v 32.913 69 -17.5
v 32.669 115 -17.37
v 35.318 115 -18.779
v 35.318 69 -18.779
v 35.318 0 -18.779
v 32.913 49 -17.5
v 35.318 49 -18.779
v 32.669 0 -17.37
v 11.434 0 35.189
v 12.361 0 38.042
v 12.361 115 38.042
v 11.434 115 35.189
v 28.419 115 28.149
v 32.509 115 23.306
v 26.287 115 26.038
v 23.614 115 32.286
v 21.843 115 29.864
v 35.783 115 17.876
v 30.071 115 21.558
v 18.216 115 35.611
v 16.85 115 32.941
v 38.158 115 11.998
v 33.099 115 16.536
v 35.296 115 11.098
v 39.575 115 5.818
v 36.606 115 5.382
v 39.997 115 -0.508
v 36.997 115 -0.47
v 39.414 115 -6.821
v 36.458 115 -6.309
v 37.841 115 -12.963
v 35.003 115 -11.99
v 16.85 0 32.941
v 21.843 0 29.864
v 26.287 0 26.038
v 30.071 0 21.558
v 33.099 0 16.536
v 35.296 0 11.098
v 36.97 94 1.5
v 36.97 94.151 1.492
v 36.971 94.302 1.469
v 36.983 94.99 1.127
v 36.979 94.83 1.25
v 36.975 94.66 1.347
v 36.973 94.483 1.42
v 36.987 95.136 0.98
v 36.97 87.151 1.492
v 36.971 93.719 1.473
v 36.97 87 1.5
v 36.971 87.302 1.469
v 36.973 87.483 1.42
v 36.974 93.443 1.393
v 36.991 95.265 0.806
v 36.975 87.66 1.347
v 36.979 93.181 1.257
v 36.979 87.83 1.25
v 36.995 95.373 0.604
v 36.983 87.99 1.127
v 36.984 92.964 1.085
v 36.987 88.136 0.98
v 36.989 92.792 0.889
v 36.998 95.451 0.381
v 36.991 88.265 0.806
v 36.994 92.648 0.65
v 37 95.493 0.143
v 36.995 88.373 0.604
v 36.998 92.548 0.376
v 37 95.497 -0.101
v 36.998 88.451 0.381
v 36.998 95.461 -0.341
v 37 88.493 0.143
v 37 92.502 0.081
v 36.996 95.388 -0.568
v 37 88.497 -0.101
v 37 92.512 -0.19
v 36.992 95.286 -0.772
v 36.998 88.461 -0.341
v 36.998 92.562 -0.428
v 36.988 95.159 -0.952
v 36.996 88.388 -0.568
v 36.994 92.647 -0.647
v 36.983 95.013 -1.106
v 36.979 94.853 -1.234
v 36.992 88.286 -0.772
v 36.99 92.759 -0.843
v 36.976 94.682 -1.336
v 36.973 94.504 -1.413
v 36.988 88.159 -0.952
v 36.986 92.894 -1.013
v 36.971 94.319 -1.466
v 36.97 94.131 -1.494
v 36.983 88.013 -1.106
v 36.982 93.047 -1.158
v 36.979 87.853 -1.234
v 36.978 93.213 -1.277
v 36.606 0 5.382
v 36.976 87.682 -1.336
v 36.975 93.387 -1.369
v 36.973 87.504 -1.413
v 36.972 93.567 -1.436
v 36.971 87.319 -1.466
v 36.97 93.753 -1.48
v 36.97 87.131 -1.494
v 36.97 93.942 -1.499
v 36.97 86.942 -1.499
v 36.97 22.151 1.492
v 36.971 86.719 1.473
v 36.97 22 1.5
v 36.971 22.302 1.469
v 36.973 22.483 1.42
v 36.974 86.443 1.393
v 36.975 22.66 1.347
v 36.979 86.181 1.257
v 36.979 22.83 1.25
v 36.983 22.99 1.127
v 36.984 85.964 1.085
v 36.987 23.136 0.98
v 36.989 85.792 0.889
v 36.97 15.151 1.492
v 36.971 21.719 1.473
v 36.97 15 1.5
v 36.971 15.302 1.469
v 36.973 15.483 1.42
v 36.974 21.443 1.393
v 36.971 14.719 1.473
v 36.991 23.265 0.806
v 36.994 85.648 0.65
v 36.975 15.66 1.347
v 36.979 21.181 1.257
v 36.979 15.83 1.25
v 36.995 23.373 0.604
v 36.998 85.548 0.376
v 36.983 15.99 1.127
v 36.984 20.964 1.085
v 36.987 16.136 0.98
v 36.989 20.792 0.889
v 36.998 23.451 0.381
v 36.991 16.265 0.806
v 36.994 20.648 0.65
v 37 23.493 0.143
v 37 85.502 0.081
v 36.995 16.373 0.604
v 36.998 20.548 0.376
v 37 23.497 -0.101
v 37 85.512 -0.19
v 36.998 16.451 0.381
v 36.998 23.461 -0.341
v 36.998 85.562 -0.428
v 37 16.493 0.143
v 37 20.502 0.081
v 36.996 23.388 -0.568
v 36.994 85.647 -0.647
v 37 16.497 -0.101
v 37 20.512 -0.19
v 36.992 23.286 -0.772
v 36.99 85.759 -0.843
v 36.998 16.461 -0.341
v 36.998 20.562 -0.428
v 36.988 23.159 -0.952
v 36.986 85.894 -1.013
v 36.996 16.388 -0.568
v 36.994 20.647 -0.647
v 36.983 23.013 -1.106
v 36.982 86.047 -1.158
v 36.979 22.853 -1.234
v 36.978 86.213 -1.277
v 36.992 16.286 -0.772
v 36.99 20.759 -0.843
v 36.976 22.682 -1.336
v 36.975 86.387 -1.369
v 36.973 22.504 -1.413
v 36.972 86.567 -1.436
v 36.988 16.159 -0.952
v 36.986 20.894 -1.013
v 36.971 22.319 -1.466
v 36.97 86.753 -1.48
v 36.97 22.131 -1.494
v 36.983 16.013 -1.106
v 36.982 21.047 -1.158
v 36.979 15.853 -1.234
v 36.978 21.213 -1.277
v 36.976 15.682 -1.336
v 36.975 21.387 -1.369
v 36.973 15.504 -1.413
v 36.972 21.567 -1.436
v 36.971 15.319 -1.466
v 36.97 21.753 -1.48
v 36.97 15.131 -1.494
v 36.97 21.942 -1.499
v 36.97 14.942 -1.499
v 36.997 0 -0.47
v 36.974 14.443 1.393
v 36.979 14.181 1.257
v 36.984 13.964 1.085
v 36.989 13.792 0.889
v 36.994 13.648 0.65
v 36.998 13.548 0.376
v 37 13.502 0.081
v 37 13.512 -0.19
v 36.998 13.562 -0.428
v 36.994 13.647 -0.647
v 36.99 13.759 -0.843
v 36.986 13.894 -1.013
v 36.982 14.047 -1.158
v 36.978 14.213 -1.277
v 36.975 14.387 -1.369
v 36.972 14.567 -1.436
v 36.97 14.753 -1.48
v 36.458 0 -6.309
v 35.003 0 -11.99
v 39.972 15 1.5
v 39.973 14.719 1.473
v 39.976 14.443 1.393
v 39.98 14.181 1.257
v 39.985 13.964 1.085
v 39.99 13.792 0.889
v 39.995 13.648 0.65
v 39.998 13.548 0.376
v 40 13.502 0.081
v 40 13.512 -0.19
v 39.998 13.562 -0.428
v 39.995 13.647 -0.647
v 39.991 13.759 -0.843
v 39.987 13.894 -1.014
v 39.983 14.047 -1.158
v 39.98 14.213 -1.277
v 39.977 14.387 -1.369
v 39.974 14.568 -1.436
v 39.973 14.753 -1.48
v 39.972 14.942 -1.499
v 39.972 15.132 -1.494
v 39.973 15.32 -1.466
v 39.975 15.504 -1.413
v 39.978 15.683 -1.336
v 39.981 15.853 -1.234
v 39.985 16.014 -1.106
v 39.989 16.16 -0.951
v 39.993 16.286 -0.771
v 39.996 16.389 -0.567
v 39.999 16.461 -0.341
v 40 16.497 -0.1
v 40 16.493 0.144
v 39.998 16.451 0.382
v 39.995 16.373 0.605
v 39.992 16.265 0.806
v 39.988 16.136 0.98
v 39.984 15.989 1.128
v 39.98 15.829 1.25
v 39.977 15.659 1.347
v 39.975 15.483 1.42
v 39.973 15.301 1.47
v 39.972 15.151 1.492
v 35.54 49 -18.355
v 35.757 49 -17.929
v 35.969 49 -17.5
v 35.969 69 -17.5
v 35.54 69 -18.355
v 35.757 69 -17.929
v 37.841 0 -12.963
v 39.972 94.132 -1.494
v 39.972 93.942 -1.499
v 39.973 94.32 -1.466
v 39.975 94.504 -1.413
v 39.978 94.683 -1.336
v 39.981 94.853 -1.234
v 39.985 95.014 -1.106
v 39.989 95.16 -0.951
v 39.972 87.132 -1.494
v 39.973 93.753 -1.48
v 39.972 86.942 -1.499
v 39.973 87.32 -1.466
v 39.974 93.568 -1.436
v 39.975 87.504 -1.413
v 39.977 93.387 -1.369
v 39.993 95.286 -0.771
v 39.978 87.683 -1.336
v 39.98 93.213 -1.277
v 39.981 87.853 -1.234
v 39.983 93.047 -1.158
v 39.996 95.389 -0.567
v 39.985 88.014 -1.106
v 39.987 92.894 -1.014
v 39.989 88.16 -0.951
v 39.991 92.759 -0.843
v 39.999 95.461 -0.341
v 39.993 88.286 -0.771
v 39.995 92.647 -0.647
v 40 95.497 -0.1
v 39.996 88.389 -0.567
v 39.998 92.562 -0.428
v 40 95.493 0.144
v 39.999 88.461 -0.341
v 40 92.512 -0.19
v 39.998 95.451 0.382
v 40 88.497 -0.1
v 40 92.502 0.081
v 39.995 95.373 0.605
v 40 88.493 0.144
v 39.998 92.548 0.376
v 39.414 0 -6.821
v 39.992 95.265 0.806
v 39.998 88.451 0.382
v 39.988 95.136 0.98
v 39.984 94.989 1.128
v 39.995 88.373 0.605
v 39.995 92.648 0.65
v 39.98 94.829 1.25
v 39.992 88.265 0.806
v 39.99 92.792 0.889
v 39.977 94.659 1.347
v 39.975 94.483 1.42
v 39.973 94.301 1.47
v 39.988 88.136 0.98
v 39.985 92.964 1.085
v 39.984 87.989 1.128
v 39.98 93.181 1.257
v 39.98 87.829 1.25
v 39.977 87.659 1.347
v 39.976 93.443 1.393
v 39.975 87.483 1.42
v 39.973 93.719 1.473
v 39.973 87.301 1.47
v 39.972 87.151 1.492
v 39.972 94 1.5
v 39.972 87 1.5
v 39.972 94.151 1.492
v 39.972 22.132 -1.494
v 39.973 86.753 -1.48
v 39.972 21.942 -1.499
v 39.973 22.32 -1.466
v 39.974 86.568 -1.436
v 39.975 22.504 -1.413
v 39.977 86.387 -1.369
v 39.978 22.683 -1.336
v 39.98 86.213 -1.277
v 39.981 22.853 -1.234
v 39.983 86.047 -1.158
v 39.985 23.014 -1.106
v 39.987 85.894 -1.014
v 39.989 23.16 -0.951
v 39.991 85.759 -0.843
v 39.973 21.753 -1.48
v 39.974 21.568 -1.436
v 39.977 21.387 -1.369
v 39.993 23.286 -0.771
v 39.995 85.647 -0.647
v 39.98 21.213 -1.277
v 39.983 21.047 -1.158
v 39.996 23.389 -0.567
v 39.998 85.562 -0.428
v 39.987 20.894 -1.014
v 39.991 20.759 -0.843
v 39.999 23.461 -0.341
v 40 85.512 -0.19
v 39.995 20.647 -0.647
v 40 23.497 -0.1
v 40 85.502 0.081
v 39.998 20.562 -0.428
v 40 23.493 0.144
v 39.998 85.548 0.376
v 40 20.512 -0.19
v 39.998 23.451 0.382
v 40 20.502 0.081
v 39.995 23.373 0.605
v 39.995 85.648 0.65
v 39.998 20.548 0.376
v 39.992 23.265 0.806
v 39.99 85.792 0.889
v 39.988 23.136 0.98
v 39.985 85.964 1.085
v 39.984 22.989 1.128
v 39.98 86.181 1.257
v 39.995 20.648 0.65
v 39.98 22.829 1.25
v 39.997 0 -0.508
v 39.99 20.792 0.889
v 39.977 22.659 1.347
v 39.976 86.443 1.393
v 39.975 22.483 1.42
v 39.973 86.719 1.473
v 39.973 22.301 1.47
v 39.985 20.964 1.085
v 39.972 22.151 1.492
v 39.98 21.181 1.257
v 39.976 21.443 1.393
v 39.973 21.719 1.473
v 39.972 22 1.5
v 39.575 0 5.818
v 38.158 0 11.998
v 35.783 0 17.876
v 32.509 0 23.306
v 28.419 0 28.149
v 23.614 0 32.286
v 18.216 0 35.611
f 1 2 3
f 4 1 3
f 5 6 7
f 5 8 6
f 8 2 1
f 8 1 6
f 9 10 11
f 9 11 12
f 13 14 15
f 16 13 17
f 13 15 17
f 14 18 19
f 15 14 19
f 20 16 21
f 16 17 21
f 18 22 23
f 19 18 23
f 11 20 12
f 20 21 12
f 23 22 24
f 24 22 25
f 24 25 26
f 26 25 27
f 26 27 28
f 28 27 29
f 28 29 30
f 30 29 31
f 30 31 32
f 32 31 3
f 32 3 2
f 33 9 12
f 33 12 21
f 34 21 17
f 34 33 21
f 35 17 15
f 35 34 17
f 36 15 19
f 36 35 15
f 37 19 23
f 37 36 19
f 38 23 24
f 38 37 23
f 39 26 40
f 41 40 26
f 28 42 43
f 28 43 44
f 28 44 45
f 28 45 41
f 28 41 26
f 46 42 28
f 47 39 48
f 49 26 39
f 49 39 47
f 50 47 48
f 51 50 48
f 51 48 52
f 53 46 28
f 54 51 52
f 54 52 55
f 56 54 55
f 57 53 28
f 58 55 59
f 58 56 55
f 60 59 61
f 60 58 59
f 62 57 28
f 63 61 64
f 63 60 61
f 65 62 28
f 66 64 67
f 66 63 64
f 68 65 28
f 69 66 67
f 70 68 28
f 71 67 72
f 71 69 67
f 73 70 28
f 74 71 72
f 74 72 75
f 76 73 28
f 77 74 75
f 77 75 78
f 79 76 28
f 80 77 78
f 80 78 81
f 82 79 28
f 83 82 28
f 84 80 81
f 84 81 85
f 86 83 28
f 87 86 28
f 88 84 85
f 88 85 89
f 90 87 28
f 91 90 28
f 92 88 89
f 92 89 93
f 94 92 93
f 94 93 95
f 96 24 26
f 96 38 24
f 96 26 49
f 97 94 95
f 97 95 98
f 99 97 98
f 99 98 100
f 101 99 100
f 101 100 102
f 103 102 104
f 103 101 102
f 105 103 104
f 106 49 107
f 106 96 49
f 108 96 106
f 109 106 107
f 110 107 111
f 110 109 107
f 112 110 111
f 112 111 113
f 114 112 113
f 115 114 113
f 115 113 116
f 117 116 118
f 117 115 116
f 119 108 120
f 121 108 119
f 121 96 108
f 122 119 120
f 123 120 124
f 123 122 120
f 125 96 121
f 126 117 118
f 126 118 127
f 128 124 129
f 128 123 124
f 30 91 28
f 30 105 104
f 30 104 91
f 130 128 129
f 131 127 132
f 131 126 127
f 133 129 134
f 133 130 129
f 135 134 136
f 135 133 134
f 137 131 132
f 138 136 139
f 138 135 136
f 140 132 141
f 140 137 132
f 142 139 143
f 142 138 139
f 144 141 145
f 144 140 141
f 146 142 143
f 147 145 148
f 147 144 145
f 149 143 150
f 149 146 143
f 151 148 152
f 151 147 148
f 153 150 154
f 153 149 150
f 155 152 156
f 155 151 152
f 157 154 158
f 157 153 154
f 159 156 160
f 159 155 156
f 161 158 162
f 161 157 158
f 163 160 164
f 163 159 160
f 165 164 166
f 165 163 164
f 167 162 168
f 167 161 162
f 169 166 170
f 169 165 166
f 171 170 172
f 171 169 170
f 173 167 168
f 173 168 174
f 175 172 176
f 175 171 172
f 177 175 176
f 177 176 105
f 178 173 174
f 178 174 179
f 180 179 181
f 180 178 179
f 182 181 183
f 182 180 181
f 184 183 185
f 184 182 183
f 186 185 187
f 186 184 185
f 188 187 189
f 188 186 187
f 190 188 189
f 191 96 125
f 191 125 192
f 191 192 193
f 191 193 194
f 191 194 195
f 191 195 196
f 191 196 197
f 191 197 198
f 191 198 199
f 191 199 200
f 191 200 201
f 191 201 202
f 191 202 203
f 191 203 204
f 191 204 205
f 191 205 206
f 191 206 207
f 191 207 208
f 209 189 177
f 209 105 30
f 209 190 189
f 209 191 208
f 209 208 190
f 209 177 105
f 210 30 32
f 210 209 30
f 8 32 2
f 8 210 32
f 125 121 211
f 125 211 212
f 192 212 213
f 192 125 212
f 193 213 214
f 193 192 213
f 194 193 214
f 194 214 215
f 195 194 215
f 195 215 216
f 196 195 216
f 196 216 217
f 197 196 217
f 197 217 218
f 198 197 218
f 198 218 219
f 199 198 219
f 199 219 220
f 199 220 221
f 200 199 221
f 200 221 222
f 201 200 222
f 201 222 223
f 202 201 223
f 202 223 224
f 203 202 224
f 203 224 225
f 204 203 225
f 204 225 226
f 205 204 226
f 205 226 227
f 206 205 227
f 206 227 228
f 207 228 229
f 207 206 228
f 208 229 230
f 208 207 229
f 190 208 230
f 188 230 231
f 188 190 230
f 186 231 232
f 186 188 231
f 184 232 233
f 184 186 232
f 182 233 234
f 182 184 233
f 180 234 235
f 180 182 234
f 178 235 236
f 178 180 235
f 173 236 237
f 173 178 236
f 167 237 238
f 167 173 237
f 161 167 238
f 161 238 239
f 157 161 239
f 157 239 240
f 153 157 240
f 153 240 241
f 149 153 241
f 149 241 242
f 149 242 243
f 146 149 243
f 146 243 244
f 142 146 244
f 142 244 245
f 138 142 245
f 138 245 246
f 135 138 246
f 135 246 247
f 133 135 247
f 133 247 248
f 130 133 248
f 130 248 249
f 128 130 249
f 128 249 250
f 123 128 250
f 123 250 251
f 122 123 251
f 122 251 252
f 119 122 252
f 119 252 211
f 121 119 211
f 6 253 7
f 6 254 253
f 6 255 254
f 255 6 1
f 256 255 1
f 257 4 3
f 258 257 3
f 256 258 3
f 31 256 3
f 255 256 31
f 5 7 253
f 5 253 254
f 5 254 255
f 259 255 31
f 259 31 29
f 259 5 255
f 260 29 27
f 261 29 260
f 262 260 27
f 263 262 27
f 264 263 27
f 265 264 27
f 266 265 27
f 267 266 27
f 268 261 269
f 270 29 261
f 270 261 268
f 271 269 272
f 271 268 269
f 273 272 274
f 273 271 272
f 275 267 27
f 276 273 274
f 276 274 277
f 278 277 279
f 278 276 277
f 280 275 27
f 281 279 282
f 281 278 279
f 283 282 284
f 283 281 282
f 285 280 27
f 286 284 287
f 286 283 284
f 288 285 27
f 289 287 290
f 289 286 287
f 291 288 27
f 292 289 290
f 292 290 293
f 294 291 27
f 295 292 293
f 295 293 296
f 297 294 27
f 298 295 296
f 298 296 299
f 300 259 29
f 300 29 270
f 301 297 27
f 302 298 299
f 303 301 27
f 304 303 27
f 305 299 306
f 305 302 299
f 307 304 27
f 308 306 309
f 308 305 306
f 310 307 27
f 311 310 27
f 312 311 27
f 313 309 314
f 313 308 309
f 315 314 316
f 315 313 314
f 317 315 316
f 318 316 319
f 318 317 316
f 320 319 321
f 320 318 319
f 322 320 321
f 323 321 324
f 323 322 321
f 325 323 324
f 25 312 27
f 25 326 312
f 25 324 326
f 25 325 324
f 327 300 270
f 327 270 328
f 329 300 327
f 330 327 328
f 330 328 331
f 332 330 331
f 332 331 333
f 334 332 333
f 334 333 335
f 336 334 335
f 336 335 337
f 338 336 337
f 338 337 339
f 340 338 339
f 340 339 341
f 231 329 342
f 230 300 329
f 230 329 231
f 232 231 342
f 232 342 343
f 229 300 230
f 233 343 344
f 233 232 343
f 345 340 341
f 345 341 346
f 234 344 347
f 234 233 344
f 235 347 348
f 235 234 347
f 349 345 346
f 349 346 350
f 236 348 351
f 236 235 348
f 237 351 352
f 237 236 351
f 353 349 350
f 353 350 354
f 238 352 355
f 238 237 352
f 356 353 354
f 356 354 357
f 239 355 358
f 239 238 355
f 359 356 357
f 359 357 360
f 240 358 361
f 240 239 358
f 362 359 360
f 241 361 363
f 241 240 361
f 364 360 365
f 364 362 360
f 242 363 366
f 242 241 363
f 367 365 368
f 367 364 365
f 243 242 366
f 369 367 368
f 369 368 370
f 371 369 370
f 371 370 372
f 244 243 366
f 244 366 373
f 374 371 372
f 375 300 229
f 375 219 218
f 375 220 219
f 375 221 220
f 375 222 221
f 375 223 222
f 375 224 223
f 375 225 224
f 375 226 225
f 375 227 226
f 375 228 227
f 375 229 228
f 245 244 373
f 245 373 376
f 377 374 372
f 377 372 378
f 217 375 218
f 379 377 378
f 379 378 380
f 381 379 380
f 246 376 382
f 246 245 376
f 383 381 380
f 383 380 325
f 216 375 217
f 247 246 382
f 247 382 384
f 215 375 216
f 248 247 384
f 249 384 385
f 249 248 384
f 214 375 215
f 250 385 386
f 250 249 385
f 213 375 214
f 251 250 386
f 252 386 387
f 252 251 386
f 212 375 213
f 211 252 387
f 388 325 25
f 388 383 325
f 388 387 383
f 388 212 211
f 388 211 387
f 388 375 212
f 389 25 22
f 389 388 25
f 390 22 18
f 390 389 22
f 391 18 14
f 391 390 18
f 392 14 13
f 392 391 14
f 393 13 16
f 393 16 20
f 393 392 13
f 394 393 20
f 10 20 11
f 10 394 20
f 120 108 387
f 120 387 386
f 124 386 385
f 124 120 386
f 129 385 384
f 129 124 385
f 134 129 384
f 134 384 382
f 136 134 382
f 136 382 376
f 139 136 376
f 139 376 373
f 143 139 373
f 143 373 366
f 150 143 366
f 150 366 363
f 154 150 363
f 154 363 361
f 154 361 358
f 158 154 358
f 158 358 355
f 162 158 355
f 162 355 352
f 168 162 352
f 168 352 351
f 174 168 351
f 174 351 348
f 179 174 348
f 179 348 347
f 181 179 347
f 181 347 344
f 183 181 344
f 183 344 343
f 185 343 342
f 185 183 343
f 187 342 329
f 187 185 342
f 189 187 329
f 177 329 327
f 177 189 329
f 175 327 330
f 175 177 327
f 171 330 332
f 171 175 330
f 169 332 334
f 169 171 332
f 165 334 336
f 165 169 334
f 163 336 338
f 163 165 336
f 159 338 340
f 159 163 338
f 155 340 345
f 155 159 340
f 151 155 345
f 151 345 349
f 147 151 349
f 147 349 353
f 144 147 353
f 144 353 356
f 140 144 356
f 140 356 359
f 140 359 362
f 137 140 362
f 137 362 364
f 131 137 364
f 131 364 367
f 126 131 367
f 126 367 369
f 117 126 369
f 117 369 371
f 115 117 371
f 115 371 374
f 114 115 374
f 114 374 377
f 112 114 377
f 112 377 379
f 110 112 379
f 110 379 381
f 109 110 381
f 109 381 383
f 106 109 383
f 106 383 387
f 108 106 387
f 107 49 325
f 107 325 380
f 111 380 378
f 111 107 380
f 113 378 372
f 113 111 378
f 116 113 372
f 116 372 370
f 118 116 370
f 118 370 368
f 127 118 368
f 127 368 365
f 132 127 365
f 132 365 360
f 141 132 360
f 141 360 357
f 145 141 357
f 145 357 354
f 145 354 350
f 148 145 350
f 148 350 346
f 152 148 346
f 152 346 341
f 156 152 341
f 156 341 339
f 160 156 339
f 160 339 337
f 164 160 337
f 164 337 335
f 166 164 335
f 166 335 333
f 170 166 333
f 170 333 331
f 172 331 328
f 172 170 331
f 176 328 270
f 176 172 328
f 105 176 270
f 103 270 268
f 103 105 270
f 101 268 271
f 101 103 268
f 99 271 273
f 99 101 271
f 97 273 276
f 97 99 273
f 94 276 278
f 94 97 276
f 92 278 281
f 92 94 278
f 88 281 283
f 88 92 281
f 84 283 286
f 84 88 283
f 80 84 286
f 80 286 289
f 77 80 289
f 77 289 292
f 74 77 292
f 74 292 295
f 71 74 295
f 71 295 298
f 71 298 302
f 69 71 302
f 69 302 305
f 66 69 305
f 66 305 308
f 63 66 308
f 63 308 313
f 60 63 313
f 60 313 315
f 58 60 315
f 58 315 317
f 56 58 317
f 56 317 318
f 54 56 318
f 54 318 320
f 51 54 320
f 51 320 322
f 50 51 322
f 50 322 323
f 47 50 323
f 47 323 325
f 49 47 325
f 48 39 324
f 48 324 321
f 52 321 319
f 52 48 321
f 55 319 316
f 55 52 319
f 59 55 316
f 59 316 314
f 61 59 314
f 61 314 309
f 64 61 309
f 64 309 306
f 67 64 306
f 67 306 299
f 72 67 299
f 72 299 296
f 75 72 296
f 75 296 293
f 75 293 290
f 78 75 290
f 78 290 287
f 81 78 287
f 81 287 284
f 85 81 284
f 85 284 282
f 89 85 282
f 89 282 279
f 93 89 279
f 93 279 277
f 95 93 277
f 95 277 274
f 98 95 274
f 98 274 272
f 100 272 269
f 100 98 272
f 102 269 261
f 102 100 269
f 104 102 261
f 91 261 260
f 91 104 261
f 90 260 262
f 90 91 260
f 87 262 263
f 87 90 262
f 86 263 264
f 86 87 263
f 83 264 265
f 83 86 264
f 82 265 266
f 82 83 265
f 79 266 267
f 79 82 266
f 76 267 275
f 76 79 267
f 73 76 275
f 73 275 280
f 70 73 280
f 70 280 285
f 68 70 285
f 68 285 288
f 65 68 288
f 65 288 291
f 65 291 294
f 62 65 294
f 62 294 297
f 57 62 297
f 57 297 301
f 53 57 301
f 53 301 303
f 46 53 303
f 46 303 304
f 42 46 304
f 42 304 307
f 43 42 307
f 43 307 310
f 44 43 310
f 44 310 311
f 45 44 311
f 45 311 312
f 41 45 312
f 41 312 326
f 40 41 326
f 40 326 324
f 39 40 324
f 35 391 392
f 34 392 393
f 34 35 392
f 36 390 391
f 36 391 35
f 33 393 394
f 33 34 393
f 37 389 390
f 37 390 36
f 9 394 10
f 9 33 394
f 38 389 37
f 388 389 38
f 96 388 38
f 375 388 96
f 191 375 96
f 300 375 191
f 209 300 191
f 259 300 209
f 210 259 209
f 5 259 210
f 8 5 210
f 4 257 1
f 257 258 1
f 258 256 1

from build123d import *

# Parameters (mm, degrees)
EXTRUSION1_DEPTH = 115
ESQUISSE6_R      = 1.5
ESQUISSE6_W      = 9.82268881
ESQUISSE6_H      = 20
EXTRUSION4_DEPTH = 128.562586974


with BuildPart() as part:
    # Esquisse5 → Extrusion1 (new body)
    with BuildSketch(Plane(origin=(0, 0, 0), x_dir=(1, 0, 0), z_dir=(0, 1, 0))):
        with BuildLine():
            Line((32.669060936, 17.370447823), (35.317903714, 18.778862511))
            ThreePointArc((35.317903714, 18.778862511), (37.087354183, -14.984263737), (12.360679775, -38.042260652))
            Line((12.360679775, -38.042260652), (11.433628792, -35.189091103))
            ThreePointArc((11.433628792, -35.189091103), (34.305802619, -13.860443956), (32.669060936, 17.370447823))
        make_face()
    extrude(amount=EXTRUSION1_DEPTH)

    # Esquisse6 → Extrusion4 (cut, through all)
    with BuildSketch(Plane(origin=(0, 0, 0), x_dir=(0, 0, -1), z_dir=(1, 0, 0))):
        with Locations(Location((0, 94, 0), (0, 0, 180))):
            Circle(ESQUISSE6_R)
        with Locations(Location((0, 87, 0), (0, 0, 180))):
            Circle(ESQUISSE6_R)
        with Locations(Location((0, 15, 0), (0, 0, 180))):
            Circle(ESQUISSE6_R)
        with Locations(Location((0, 22, 0), (0, 0, 180))):
            Circle(ESQUISSE6_R)
        with Locations((22.411344405, 59)):
            Rectangle(ESQUISSE6_W, ESQUISSE6_H)
    extrude(amount=EXTRUSION4_DEPTH, mode=Mode.SUBTRACT)


solid = part.part
